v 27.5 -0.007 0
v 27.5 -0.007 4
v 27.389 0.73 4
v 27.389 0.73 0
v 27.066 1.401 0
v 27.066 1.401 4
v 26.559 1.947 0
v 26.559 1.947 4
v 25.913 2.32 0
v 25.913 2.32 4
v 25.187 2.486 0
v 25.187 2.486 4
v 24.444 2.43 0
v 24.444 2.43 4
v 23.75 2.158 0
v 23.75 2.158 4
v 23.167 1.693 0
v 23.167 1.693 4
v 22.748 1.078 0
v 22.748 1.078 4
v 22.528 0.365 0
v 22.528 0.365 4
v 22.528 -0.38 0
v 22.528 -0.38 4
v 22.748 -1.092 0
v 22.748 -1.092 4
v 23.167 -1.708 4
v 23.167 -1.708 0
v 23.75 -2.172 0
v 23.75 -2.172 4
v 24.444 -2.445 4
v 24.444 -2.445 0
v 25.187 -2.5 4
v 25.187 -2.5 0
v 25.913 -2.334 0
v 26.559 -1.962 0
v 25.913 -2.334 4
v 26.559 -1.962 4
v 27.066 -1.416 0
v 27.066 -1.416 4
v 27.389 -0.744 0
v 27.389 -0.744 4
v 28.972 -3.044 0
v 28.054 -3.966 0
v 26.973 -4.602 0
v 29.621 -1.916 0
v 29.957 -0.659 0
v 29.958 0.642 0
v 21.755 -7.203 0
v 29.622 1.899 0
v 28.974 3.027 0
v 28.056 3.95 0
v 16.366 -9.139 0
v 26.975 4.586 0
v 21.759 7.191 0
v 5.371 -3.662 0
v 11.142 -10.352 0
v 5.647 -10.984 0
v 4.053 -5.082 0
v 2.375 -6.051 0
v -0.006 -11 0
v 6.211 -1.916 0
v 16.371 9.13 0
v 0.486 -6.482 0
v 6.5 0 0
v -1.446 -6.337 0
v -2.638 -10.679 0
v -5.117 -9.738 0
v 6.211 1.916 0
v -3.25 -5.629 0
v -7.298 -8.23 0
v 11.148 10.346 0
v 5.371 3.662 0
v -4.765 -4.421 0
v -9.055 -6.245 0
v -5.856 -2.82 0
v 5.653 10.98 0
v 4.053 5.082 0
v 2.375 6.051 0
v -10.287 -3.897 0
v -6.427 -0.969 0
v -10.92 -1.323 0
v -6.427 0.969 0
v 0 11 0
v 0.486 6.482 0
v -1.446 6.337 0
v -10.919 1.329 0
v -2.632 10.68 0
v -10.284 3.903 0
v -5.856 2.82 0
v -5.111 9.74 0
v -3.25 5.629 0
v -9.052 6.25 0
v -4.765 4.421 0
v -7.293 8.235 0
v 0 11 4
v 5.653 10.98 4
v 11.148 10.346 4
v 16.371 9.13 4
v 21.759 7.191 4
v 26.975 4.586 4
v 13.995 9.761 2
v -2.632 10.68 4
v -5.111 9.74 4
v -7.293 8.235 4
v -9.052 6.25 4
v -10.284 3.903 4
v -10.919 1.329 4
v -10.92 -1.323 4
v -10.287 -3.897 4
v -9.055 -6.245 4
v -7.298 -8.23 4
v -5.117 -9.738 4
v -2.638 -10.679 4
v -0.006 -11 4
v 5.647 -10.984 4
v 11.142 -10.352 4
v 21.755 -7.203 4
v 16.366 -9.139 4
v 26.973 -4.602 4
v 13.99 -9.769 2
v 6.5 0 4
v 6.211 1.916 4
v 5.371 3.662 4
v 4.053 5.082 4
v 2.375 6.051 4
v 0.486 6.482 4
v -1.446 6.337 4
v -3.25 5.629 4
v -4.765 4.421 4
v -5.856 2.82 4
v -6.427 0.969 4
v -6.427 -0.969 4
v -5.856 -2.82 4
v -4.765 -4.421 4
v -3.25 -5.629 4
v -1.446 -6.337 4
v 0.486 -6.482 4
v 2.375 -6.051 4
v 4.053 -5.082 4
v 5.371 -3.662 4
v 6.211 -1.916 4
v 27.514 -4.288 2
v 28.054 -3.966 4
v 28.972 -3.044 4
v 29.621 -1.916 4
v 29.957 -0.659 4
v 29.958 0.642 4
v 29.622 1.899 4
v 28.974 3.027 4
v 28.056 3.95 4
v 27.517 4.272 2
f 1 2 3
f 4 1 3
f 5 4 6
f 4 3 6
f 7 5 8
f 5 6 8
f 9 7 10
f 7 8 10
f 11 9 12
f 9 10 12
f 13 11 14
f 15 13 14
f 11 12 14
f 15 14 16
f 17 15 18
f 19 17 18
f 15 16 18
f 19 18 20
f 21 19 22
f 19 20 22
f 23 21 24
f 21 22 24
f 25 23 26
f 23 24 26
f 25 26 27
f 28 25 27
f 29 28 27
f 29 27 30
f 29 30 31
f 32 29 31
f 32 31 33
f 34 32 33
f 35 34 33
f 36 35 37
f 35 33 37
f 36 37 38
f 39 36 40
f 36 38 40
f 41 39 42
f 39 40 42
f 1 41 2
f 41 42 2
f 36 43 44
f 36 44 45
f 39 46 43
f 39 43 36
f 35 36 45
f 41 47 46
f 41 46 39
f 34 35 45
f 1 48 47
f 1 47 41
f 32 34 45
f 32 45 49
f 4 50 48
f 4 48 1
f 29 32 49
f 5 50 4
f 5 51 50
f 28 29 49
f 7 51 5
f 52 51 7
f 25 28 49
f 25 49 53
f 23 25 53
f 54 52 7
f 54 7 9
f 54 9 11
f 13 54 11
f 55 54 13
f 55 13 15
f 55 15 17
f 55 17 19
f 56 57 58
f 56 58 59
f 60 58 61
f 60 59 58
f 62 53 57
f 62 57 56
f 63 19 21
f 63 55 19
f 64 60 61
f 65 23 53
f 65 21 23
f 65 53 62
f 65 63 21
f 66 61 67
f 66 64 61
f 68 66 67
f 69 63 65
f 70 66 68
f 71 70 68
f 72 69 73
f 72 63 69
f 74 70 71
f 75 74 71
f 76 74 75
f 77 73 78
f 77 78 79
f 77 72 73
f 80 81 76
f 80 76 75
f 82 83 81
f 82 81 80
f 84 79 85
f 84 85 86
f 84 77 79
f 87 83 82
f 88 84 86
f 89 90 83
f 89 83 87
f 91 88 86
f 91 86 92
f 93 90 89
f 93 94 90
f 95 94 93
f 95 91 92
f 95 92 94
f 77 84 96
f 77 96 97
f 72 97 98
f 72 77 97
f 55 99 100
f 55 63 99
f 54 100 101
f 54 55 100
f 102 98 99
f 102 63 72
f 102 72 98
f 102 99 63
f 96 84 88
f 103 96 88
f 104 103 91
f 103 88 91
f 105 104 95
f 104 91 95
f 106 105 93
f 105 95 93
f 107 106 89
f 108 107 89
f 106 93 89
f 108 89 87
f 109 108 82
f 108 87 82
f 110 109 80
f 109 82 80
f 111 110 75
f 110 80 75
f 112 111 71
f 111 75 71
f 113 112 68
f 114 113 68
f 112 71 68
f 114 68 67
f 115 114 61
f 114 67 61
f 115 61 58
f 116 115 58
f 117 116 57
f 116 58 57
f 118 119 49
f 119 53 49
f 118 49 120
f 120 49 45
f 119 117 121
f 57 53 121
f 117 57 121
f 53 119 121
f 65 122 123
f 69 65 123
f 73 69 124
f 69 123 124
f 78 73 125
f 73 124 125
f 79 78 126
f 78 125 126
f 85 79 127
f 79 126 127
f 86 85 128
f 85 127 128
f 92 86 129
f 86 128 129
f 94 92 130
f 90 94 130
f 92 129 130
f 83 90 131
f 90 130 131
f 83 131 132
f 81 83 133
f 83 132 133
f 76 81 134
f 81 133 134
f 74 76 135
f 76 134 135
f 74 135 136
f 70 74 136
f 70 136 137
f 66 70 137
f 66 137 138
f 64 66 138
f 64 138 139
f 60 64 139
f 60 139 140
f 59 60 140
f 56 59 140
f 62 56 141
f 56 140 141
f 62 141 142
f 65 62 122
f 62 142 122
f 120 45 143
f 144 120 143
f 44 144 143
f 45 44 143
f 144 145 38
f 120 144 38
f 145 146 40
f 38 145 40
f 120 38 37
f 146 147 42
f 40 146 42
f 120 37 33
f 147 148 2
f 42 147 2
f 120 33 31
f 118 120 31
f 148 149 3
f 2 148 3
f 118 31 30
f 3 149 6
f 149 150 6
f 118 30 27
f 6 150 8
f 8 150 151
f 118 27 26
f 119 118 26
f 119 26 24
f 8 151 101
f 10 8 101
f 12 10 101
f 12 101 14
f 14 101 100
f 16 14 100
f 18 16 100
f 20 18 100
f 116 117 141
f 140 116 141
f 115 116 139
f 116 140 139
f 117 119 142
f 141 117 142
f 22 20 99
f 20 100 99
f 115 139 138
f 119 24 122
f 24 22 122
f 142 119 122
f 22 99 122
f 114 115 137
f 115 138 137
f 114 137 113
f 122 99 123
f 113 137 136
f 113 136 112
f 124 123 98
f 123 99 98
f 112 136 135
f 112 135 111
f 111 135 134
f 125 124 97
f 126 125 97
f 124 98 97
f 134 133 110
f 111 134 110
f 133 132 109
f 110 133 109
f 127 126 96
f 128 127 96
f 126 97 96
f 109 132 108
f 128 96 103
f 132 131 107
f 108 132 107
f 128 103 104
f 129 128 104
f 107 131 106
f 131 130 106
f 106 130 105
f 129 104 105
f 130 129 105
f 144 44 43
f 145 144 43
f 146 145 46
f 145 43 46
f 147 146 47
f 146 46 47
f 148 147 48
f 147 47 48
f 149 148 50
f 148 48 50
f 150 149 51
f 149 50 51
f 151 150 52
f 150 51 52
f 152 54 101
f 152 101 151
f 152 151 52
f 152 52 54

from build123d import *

# Parameters (mm, degrees)
ESQUISSE1_R             = 11
BOSS_EXTRU_2_DEPTH      = 4
BOSS_EXTRU_3_DEPTH      = 4
ESQUISSE6_R             = 6.5
ENL_V_MAT_EXTRU_1_DEPTH = 4
ESQUISSE7_R             = 2.5
ENL_V_MAT_EXTRU_2_DEPTH = 4
EPAISSIR3_DEPTH         = 4


# Read off the part's stored shape, not the designer's step: Boss.-Extru.3, Epaissir3
with BuildPart() as part:
    # Esquisse1 → Boss.-Extru.2 (new body)
    with BuildSketch(Plane.XY):
        Circle(ESQUISSE1_R)
    extrude(amount=BOSS_EXTRU_2_DEPTH)

    # Esquisse6 → Enlèv. mat.-Extru.1 (cut)
    with BuildSketch(Plane.XY.offset(4)):
        Circle(ESQUISSE6_R)
    extrude(amount=-ENL_V_MAT_EXTRU_1_DEPTH, mode=Mode.SUBTRACT)



with BuildPart() as body_2:
    # Boss.-Extru.3 outline → Boss.-Extru.3 (new body)
    with BuildSketch(Plane.XY):
        with BuildLine():
            ThreePointArc((26.975217648, 4.586105757), (19.99999917, -0.005763433), (26.972567207, -4.601656213))
            add(Edge.make_bspline(
                [(26.972567207, -4.601656213), (27.515164642, -4.291363801), (28.053929341, -3.966183827)],
                knots=[0.958322196, 0.958322196, 0.958322196, 1, 1, 1], degree=2))
            ThreePointArc((28.053929341, -3.966183827), (29.999998754, -0.008646725), (28.056210795, 3.95001155))
            add(Edge.make_bspline(
                [(26.975217648, 4.586105757), (27.517634871, 4.275501294), (28.056210795, 3.95001155)],
                knots=[0.958322291, 0.958322291, 0.958322291, 1, 1, 1], degree=2))
        make_face()
    extrude(amount=BOSS_EXTRU_3_DEPTH)

    # Esquisse7 → Enlèv. mat.-Extru.2 (cut)
    with BuildSketch(Plane.XY.offset(4)):
        with Locations((24.999998962, -0.007205809)):
            Circle(ESQUISSE7_R)
    extrude(amount=-ENL_V_MAT_EXTRU_2_DEPTH, mode=Mode.SUBTRACT)


with BuildPart() as part_1:
    add(part.part)

    add(body_2.part)  # Epaissir3 merges body 2
    # Epaissir3 outline → Epaissir3 (add)
    with BuildSketch(Plane.XY):
        with BuildLine():
            add(Edge.make_bspline(
                [(0, 11), (14.503070624, 11.728033327), (26.975217648, 4.586105757)],
                knots=[0, 0, 0, 0.958322291, 0.958322291, 0.958322291], degree=2))
            ThreePointArc((0, 11), (10.999999543, -0.003170596), (-0.006341192, -10.999998172))
            add(Edge.make_bspline(
                [(-0.006341192, -10.999998172), (14.496306132, -11.736391644), (26.972567207, -4.601656213)],
                knots=[0, 0, 0, 0.958322196, 0.958322196, 0.958322196], degree=2))
            ThreePointArc((26.972567207, -4.601656213), (19.99999917, -0.005763433), (26.975217648, 4.586105757))
        make_face()
    extrude(amount=EPAISSIR3_DEPTH)


solid = part_1.part
